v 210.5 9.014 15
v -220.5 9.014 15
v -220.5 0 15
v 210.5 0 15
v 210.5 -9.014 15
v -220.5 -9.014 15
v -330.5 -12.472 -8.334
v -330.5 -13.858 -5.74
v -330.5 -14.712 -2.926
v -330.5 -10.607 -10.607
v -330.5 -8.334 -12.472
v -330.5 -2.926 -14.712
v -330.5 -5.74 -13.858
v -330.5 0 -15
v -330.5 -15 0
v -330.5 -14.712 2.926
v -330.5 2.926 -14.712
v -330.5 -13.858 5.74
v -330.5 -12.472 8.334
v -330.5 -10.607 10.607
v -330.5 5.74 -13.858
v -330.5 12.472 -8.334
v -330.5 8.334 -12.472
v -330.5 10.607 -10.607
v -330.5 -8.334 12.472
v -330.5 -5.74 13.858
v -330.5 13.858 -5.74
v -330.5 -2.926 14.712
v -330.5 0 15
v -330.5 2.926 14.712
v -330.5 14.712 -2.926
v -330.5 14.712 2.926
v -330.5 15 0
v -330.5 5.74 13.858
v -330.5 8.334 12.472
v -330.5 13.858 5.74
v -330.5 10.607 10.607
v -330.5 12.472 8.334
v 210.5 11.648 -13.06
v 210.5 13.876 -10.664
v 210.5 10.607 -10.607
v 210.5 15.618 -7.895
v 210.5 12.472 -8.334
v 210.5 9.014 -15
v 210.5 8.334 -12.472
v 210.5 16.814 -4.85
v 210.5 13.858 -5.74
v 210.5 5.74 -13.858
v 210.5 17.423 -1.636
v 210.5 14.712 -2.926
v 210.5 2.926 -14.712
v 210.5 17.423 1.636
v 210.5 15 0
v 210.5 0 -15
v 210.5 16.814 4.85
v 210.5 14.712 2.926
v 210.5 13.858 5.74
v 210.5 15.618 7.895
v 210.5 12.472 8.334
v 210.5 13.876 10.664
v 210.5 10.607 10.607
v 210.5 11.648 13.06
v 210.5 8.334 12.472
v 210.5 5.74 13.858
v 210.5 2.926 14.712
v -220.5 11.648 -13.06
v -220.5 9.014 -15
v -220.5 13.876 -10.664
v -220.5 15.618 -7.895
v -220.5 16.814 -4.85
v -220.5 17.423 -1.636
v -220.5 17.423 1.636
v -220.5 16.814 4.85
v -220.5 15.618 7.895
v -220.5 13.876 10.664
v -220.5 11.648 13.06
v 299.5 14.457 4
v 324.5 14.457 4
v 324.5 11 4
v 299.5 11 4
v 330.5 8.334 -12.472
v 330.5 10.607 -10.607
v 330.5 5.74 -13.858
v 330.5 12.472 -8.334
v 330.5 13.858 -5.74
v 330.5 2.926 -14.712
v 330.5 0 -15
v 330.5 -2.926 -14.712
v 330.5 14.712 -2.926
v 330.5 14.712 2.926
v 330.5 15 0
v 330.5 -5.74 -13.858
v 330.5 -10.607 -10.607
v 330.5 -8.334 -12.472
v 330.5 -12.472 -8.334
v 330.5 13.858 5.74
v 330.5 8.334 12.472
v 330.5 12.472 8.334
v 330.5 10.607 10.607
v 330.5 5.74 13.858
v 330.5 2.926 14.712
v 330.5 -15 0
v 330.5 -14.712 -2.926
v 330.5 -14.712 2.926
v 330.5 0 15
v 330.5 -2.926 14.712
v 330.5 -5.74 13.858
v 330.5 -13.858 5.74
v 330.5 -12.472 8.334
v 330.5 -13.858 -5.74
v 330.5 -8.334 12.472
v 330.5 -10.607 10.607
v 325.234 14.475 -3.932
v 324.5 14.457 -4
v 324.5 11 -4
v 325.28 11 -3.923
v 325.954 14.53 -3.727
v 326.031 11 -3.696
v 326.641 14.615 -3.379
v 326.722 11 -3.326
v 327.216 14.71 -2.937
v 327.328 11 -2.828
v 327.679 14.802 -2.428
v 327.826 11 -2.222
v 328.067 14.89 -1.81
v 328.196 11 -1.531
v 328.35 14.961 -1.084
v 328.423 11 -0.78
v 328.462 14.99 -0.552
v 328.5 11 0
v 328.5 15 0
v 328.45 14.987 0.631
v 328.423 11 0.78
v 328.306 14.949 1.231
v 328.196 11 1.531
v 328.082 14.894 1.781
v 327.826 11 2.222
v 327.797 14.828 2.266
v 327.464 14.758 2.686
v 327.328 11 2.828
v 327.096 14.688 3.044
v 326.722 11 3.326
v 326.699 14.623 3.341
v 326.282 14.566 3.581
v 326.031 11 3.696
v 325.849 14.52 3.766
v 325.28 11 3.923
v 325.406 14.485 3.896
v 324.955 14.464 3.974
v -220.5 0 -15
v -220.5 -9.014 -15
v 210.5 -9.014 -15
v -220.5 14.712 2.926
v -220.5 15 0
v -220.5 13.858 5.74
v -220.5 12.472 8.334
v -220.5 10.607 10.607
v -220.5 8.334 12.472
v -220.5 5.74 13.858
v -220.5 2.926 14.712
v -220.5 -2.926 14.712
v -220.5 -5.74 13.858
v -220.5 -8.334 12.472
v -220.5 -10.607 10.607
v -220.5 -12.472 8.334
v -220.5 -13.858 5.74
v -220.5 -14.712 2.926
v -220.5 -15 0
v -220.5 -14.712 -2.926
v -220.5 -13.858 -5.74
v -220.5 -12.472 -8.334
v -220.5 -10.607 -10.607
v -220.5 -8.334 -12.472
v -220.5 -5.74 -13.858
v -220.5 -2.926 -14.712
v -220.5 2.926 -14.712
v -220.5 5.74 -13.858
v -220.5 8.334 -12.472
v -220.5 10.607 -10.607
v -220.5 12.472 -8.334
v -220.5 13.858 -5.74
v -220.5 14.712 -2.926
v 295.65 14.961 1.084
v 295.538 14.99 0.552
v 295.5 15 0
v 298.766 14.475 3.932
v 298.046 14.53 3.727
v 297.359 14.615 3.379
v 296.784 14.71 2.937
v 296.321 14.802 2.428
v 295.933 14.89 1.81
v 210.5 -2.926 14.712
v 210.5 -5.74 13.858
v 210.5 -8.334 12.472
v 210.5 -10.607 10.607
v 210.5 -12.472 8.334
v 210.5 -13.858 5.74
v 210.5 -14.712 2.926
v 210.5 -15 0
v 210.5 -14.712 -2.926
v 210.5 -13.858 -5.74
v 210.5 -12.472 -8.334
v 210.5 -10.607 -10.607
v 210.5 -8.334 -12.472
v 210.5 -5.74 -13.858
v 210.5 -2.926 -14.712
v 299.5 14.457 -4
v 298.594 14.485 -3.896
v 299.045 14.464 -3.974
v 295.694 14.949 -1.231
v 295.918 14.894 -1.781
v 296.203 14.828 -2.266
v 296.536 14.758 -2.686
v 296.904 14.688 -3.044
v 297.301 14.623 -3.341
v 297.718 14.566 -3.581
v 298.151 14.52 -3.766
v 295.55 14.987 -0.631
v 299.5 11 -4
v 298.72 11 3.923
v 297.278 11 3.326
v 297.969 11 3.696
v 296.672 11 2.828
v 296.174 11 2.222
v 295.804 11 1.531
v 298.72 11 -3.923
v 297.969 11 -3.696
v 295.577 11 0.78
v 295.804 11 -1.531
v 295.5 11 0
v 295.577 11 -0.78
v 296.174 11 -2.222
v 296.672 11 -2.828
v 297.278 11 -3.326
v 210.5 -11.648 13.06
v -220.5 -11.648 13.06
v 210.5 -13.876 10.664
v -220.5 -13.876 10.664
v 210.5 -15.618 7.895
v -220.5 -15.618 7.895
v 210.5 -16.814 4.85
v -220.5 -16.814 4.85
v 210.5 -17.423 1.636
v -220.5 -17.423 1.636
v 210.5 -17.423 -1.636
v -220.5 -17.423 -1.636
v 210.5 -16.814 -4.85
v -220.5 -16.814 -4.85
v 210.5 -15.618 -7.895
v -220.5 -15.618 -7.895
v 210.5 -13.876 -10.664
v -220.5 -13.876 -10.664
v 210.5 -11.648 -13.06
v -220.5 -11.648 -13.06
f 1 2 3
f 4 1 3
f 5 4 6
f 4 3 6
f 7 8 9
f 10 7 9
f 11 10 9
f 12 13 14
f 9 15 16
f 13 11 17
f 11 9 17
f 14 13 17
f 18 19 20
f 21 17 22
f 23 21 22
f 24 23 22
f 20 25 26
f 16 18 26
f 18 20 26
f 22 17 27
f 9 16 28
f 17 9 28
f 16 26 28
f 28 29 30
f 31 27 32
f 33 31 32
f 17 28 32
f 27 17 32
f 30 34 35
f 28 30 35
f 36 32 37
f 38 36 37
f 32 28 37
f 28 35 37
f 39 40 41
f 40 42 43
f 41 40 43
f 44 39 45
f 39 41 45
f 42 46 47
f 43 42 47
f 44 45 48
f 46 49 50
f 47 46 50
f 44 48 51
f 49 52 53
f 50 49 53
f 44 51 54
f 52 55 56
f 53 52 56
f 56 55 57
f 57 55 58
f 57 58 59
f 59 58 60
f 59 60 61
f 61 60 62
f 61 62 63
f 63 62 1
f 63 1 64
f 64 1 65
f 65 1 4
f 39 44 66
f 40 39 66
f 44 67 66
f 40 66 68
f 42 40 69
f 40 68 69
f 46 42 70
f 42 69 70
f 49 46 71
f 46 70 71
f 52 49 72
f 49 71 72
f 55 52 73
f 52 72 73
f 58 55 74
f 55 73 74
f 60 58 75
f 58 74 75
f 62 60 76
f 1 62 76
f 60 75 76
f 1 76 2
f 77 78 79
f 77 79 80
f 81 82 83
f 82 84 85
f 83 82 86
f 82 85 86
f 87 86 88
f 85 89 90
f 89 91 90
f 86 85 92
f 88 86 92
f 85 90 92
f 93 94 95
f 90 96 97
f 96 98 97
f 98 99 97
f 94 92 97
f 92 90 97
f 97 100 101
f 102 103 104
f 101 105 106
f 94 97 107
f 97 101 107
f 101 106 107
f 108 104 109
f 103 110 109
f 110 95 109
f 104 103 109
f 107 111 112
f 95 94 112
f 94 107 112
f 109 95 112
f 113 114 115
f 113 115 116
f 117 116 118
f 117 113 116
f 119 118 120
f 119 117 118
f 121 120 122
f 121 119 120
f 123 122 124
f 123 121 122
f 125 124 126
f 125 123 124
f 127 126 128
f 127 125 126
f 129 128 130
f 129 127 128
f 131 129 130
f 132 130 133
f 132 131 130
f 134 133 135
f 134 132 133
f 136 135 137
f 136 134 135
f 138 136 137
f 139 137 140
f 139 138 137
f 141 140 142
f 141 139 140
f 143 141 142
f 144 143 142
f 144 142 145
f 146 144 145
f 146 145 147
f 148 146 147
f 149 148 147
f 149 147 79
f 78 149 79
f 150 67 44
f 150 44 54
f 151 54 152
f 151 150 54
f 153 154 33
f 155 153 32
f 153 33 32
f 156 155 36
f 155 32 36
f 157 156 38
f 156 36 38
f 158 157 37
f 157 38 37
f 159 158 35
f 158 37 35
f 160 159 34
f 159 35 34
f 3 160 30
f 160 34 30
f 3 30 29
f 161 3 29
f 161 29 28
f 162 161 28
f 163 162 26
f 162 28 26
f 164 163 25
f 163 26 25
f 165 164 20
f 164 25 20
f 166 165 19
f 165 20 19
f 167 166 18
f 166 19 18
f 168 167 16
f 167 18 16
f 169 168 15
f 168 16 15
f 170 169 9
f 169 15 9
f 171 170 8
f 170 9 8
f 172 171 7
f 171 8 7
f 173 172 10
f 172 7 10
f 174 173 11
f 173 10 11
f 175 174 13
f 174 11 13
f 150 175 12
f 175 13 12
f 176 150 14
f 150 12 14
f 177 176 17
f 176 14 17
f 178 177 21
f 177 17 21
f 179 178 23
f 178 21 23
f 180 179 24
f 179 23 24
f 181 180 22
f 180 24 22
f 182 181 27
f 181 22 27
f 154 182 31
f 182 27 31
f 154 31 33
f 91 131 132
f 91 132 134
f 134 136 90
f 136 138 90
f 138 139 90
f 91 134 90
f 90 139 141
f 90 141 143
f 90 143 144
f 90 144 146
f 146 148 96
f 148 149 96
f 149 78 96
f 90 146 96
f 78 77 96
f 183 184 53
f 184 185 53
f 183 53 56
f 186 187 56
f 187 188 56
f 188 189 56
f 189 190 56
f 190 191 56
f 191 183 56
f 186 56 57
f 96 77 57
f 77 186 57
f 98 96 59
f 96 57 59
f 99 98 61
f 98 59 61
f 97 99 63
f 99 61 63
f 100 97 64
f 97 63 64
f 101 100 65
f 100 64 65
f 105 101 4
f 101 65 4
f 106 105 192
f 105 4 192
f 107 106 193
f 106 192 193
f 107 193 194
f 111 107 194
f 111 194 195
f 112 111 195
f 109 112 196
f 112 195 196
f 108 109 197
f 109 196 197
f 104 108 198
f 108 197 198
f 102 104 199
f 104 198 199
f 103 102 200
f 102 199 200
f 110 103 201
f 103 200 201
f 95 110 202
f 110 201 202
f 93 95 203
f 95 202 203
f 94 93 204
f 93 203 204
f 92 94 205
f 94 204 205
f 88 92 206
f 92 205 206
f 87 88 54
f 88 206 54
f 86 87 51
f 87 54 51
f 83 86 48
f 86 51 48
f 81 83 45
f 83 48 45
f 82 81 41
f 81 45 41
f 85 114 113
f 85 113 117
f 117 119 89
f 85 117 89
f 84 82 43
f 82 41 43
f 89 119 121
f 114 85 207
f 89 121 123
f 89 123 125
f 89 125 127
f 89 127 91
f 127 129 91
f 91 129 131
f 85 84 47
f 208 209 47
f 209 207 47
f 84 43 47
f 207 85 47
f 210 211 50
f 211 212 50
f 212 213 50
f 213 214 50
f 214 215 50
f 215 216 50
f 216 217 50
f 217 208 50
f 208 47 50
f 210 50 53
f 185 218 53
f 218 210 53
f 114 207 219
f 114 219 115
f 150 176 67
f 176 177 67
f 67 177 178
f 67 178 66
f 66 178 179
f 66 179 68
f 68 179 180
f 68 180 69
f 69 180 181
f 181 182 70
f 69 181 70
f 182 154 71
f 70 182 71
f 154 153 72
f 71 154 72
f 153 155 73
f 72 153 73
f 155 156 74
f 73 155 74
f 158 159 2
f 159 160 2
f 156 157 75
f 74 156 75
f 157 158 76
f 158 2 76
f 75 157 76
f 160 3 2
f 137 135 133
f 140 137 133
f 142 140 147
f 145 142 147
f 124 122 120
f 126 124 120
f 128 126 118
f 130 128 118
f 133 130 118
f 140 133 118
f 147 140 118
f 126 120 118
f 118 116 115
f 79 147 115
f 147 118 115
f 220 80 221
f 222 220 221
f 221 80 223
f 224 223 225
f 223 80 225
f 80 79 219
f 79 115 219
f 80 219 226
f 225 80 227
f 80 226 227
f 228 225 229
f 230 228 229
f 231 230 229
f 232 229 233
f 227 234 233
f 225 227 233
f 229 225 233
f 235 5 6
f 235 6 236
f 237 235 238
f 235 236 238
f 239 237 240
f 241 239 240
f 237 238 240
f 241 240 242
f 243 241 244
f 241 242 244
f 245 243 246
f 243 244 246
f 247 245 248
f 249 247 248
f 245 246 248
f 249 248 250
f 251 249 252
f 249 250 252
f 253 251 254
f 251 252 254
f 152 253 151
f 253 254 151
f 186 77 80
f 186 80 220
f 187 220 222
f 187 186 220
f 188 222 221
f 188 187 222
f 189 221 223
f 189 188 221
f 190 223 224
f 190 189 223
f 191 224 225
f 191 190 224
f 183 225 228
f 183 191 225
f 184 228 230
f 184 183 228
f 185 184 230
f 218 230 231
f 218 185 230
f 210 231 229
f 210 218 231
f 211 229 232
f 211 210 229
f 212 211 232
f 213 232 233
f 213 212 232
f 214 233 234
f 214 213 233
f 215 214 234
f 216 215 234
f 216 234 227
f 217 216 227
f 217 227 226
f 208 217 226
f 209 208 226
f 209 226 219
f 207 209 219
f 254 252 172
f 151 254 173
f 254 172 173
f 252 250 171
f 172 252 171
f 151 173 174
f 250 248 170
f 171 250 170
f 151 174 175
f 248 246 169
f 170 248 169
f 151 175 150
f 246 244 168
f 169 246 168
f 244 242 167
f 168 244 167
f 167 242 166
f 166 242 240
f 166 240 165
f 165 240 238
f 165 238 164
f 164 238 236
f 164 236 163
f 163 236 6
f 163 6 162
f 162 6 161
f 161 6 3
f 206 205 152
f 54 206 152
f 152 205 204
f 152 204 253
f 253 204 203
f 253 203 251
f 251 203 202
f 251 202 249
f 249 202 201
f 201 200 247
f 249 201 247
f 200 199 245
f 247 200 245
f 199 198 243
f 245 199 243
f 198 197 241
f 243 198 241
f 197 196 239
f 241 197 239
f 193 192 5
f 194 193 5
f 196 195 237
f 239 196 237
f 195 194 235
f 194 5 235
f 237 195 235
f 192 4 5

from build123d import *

# Parameters (mm, degrees)
KES_EKSTR_ZYON1_DEPTH = 431
KES_EKSTR_ZYON2_DEPTH = 4


with BuildPart() as part:
    # Çizim1 → Döndür1 (revolve)
    with BuildSketch(Plane.XY):
        Polygon((-330.5, 0), (330.5, 0), (330.5, 15), (210.5, 15), (210.5, 17.5), (-220.5, 17.5), (-220.5, 15), (-330.5, 15), align=None)
    revolve(axis=Axis((-330.5, 0, 0), (1, 0, 0)))

    # Çizim2 → Kes-Ekstrüzyon1 (cut)
    with BuildSketch(Plane.ZY.offset(220.5)):
        with BuildLine():
            Line((-15, 9.013878189), (-15, -9.013878189))
            ThreePointArc((-15, -9.013878189), (-17.5, 0), (-15, 9.013878189))
        make_face()
        with BuildLine():
            Line((15, 9.013878189), (15, -9.013878189))
            ThreePointArc((15, -9.013878189), (17.5, 0), (15, 9.013878189))
        make_face()
    extrude(amount=-KES_EKSTR_ZYON1_DEPTH, mode=Mode.SUBTRACT)

    # Çizim3 → Kes-Ekstrüzyon2 (cut)
    with BuildSketch(Plane(origin=(0, 15, 0), x_dir=(1, 0, 0), z_dir=(0, 1, 0))):
        with BuildLine():
            Line((324.5, -4), (299.5, -4))
            ThreePointArc((299.5, -4), (295.5, 0), (299.5, 4))
            Line((299.5, 4), (324.5, 4))
            ThreePointArc((324.5, 4), (328.5, 0), (324.5, -4))
        make_face()
    extrude(amount=-KES_EKSTR_ZYON2_DEPTH, mode=Mode.SUBTRACT)


solid = part.part
